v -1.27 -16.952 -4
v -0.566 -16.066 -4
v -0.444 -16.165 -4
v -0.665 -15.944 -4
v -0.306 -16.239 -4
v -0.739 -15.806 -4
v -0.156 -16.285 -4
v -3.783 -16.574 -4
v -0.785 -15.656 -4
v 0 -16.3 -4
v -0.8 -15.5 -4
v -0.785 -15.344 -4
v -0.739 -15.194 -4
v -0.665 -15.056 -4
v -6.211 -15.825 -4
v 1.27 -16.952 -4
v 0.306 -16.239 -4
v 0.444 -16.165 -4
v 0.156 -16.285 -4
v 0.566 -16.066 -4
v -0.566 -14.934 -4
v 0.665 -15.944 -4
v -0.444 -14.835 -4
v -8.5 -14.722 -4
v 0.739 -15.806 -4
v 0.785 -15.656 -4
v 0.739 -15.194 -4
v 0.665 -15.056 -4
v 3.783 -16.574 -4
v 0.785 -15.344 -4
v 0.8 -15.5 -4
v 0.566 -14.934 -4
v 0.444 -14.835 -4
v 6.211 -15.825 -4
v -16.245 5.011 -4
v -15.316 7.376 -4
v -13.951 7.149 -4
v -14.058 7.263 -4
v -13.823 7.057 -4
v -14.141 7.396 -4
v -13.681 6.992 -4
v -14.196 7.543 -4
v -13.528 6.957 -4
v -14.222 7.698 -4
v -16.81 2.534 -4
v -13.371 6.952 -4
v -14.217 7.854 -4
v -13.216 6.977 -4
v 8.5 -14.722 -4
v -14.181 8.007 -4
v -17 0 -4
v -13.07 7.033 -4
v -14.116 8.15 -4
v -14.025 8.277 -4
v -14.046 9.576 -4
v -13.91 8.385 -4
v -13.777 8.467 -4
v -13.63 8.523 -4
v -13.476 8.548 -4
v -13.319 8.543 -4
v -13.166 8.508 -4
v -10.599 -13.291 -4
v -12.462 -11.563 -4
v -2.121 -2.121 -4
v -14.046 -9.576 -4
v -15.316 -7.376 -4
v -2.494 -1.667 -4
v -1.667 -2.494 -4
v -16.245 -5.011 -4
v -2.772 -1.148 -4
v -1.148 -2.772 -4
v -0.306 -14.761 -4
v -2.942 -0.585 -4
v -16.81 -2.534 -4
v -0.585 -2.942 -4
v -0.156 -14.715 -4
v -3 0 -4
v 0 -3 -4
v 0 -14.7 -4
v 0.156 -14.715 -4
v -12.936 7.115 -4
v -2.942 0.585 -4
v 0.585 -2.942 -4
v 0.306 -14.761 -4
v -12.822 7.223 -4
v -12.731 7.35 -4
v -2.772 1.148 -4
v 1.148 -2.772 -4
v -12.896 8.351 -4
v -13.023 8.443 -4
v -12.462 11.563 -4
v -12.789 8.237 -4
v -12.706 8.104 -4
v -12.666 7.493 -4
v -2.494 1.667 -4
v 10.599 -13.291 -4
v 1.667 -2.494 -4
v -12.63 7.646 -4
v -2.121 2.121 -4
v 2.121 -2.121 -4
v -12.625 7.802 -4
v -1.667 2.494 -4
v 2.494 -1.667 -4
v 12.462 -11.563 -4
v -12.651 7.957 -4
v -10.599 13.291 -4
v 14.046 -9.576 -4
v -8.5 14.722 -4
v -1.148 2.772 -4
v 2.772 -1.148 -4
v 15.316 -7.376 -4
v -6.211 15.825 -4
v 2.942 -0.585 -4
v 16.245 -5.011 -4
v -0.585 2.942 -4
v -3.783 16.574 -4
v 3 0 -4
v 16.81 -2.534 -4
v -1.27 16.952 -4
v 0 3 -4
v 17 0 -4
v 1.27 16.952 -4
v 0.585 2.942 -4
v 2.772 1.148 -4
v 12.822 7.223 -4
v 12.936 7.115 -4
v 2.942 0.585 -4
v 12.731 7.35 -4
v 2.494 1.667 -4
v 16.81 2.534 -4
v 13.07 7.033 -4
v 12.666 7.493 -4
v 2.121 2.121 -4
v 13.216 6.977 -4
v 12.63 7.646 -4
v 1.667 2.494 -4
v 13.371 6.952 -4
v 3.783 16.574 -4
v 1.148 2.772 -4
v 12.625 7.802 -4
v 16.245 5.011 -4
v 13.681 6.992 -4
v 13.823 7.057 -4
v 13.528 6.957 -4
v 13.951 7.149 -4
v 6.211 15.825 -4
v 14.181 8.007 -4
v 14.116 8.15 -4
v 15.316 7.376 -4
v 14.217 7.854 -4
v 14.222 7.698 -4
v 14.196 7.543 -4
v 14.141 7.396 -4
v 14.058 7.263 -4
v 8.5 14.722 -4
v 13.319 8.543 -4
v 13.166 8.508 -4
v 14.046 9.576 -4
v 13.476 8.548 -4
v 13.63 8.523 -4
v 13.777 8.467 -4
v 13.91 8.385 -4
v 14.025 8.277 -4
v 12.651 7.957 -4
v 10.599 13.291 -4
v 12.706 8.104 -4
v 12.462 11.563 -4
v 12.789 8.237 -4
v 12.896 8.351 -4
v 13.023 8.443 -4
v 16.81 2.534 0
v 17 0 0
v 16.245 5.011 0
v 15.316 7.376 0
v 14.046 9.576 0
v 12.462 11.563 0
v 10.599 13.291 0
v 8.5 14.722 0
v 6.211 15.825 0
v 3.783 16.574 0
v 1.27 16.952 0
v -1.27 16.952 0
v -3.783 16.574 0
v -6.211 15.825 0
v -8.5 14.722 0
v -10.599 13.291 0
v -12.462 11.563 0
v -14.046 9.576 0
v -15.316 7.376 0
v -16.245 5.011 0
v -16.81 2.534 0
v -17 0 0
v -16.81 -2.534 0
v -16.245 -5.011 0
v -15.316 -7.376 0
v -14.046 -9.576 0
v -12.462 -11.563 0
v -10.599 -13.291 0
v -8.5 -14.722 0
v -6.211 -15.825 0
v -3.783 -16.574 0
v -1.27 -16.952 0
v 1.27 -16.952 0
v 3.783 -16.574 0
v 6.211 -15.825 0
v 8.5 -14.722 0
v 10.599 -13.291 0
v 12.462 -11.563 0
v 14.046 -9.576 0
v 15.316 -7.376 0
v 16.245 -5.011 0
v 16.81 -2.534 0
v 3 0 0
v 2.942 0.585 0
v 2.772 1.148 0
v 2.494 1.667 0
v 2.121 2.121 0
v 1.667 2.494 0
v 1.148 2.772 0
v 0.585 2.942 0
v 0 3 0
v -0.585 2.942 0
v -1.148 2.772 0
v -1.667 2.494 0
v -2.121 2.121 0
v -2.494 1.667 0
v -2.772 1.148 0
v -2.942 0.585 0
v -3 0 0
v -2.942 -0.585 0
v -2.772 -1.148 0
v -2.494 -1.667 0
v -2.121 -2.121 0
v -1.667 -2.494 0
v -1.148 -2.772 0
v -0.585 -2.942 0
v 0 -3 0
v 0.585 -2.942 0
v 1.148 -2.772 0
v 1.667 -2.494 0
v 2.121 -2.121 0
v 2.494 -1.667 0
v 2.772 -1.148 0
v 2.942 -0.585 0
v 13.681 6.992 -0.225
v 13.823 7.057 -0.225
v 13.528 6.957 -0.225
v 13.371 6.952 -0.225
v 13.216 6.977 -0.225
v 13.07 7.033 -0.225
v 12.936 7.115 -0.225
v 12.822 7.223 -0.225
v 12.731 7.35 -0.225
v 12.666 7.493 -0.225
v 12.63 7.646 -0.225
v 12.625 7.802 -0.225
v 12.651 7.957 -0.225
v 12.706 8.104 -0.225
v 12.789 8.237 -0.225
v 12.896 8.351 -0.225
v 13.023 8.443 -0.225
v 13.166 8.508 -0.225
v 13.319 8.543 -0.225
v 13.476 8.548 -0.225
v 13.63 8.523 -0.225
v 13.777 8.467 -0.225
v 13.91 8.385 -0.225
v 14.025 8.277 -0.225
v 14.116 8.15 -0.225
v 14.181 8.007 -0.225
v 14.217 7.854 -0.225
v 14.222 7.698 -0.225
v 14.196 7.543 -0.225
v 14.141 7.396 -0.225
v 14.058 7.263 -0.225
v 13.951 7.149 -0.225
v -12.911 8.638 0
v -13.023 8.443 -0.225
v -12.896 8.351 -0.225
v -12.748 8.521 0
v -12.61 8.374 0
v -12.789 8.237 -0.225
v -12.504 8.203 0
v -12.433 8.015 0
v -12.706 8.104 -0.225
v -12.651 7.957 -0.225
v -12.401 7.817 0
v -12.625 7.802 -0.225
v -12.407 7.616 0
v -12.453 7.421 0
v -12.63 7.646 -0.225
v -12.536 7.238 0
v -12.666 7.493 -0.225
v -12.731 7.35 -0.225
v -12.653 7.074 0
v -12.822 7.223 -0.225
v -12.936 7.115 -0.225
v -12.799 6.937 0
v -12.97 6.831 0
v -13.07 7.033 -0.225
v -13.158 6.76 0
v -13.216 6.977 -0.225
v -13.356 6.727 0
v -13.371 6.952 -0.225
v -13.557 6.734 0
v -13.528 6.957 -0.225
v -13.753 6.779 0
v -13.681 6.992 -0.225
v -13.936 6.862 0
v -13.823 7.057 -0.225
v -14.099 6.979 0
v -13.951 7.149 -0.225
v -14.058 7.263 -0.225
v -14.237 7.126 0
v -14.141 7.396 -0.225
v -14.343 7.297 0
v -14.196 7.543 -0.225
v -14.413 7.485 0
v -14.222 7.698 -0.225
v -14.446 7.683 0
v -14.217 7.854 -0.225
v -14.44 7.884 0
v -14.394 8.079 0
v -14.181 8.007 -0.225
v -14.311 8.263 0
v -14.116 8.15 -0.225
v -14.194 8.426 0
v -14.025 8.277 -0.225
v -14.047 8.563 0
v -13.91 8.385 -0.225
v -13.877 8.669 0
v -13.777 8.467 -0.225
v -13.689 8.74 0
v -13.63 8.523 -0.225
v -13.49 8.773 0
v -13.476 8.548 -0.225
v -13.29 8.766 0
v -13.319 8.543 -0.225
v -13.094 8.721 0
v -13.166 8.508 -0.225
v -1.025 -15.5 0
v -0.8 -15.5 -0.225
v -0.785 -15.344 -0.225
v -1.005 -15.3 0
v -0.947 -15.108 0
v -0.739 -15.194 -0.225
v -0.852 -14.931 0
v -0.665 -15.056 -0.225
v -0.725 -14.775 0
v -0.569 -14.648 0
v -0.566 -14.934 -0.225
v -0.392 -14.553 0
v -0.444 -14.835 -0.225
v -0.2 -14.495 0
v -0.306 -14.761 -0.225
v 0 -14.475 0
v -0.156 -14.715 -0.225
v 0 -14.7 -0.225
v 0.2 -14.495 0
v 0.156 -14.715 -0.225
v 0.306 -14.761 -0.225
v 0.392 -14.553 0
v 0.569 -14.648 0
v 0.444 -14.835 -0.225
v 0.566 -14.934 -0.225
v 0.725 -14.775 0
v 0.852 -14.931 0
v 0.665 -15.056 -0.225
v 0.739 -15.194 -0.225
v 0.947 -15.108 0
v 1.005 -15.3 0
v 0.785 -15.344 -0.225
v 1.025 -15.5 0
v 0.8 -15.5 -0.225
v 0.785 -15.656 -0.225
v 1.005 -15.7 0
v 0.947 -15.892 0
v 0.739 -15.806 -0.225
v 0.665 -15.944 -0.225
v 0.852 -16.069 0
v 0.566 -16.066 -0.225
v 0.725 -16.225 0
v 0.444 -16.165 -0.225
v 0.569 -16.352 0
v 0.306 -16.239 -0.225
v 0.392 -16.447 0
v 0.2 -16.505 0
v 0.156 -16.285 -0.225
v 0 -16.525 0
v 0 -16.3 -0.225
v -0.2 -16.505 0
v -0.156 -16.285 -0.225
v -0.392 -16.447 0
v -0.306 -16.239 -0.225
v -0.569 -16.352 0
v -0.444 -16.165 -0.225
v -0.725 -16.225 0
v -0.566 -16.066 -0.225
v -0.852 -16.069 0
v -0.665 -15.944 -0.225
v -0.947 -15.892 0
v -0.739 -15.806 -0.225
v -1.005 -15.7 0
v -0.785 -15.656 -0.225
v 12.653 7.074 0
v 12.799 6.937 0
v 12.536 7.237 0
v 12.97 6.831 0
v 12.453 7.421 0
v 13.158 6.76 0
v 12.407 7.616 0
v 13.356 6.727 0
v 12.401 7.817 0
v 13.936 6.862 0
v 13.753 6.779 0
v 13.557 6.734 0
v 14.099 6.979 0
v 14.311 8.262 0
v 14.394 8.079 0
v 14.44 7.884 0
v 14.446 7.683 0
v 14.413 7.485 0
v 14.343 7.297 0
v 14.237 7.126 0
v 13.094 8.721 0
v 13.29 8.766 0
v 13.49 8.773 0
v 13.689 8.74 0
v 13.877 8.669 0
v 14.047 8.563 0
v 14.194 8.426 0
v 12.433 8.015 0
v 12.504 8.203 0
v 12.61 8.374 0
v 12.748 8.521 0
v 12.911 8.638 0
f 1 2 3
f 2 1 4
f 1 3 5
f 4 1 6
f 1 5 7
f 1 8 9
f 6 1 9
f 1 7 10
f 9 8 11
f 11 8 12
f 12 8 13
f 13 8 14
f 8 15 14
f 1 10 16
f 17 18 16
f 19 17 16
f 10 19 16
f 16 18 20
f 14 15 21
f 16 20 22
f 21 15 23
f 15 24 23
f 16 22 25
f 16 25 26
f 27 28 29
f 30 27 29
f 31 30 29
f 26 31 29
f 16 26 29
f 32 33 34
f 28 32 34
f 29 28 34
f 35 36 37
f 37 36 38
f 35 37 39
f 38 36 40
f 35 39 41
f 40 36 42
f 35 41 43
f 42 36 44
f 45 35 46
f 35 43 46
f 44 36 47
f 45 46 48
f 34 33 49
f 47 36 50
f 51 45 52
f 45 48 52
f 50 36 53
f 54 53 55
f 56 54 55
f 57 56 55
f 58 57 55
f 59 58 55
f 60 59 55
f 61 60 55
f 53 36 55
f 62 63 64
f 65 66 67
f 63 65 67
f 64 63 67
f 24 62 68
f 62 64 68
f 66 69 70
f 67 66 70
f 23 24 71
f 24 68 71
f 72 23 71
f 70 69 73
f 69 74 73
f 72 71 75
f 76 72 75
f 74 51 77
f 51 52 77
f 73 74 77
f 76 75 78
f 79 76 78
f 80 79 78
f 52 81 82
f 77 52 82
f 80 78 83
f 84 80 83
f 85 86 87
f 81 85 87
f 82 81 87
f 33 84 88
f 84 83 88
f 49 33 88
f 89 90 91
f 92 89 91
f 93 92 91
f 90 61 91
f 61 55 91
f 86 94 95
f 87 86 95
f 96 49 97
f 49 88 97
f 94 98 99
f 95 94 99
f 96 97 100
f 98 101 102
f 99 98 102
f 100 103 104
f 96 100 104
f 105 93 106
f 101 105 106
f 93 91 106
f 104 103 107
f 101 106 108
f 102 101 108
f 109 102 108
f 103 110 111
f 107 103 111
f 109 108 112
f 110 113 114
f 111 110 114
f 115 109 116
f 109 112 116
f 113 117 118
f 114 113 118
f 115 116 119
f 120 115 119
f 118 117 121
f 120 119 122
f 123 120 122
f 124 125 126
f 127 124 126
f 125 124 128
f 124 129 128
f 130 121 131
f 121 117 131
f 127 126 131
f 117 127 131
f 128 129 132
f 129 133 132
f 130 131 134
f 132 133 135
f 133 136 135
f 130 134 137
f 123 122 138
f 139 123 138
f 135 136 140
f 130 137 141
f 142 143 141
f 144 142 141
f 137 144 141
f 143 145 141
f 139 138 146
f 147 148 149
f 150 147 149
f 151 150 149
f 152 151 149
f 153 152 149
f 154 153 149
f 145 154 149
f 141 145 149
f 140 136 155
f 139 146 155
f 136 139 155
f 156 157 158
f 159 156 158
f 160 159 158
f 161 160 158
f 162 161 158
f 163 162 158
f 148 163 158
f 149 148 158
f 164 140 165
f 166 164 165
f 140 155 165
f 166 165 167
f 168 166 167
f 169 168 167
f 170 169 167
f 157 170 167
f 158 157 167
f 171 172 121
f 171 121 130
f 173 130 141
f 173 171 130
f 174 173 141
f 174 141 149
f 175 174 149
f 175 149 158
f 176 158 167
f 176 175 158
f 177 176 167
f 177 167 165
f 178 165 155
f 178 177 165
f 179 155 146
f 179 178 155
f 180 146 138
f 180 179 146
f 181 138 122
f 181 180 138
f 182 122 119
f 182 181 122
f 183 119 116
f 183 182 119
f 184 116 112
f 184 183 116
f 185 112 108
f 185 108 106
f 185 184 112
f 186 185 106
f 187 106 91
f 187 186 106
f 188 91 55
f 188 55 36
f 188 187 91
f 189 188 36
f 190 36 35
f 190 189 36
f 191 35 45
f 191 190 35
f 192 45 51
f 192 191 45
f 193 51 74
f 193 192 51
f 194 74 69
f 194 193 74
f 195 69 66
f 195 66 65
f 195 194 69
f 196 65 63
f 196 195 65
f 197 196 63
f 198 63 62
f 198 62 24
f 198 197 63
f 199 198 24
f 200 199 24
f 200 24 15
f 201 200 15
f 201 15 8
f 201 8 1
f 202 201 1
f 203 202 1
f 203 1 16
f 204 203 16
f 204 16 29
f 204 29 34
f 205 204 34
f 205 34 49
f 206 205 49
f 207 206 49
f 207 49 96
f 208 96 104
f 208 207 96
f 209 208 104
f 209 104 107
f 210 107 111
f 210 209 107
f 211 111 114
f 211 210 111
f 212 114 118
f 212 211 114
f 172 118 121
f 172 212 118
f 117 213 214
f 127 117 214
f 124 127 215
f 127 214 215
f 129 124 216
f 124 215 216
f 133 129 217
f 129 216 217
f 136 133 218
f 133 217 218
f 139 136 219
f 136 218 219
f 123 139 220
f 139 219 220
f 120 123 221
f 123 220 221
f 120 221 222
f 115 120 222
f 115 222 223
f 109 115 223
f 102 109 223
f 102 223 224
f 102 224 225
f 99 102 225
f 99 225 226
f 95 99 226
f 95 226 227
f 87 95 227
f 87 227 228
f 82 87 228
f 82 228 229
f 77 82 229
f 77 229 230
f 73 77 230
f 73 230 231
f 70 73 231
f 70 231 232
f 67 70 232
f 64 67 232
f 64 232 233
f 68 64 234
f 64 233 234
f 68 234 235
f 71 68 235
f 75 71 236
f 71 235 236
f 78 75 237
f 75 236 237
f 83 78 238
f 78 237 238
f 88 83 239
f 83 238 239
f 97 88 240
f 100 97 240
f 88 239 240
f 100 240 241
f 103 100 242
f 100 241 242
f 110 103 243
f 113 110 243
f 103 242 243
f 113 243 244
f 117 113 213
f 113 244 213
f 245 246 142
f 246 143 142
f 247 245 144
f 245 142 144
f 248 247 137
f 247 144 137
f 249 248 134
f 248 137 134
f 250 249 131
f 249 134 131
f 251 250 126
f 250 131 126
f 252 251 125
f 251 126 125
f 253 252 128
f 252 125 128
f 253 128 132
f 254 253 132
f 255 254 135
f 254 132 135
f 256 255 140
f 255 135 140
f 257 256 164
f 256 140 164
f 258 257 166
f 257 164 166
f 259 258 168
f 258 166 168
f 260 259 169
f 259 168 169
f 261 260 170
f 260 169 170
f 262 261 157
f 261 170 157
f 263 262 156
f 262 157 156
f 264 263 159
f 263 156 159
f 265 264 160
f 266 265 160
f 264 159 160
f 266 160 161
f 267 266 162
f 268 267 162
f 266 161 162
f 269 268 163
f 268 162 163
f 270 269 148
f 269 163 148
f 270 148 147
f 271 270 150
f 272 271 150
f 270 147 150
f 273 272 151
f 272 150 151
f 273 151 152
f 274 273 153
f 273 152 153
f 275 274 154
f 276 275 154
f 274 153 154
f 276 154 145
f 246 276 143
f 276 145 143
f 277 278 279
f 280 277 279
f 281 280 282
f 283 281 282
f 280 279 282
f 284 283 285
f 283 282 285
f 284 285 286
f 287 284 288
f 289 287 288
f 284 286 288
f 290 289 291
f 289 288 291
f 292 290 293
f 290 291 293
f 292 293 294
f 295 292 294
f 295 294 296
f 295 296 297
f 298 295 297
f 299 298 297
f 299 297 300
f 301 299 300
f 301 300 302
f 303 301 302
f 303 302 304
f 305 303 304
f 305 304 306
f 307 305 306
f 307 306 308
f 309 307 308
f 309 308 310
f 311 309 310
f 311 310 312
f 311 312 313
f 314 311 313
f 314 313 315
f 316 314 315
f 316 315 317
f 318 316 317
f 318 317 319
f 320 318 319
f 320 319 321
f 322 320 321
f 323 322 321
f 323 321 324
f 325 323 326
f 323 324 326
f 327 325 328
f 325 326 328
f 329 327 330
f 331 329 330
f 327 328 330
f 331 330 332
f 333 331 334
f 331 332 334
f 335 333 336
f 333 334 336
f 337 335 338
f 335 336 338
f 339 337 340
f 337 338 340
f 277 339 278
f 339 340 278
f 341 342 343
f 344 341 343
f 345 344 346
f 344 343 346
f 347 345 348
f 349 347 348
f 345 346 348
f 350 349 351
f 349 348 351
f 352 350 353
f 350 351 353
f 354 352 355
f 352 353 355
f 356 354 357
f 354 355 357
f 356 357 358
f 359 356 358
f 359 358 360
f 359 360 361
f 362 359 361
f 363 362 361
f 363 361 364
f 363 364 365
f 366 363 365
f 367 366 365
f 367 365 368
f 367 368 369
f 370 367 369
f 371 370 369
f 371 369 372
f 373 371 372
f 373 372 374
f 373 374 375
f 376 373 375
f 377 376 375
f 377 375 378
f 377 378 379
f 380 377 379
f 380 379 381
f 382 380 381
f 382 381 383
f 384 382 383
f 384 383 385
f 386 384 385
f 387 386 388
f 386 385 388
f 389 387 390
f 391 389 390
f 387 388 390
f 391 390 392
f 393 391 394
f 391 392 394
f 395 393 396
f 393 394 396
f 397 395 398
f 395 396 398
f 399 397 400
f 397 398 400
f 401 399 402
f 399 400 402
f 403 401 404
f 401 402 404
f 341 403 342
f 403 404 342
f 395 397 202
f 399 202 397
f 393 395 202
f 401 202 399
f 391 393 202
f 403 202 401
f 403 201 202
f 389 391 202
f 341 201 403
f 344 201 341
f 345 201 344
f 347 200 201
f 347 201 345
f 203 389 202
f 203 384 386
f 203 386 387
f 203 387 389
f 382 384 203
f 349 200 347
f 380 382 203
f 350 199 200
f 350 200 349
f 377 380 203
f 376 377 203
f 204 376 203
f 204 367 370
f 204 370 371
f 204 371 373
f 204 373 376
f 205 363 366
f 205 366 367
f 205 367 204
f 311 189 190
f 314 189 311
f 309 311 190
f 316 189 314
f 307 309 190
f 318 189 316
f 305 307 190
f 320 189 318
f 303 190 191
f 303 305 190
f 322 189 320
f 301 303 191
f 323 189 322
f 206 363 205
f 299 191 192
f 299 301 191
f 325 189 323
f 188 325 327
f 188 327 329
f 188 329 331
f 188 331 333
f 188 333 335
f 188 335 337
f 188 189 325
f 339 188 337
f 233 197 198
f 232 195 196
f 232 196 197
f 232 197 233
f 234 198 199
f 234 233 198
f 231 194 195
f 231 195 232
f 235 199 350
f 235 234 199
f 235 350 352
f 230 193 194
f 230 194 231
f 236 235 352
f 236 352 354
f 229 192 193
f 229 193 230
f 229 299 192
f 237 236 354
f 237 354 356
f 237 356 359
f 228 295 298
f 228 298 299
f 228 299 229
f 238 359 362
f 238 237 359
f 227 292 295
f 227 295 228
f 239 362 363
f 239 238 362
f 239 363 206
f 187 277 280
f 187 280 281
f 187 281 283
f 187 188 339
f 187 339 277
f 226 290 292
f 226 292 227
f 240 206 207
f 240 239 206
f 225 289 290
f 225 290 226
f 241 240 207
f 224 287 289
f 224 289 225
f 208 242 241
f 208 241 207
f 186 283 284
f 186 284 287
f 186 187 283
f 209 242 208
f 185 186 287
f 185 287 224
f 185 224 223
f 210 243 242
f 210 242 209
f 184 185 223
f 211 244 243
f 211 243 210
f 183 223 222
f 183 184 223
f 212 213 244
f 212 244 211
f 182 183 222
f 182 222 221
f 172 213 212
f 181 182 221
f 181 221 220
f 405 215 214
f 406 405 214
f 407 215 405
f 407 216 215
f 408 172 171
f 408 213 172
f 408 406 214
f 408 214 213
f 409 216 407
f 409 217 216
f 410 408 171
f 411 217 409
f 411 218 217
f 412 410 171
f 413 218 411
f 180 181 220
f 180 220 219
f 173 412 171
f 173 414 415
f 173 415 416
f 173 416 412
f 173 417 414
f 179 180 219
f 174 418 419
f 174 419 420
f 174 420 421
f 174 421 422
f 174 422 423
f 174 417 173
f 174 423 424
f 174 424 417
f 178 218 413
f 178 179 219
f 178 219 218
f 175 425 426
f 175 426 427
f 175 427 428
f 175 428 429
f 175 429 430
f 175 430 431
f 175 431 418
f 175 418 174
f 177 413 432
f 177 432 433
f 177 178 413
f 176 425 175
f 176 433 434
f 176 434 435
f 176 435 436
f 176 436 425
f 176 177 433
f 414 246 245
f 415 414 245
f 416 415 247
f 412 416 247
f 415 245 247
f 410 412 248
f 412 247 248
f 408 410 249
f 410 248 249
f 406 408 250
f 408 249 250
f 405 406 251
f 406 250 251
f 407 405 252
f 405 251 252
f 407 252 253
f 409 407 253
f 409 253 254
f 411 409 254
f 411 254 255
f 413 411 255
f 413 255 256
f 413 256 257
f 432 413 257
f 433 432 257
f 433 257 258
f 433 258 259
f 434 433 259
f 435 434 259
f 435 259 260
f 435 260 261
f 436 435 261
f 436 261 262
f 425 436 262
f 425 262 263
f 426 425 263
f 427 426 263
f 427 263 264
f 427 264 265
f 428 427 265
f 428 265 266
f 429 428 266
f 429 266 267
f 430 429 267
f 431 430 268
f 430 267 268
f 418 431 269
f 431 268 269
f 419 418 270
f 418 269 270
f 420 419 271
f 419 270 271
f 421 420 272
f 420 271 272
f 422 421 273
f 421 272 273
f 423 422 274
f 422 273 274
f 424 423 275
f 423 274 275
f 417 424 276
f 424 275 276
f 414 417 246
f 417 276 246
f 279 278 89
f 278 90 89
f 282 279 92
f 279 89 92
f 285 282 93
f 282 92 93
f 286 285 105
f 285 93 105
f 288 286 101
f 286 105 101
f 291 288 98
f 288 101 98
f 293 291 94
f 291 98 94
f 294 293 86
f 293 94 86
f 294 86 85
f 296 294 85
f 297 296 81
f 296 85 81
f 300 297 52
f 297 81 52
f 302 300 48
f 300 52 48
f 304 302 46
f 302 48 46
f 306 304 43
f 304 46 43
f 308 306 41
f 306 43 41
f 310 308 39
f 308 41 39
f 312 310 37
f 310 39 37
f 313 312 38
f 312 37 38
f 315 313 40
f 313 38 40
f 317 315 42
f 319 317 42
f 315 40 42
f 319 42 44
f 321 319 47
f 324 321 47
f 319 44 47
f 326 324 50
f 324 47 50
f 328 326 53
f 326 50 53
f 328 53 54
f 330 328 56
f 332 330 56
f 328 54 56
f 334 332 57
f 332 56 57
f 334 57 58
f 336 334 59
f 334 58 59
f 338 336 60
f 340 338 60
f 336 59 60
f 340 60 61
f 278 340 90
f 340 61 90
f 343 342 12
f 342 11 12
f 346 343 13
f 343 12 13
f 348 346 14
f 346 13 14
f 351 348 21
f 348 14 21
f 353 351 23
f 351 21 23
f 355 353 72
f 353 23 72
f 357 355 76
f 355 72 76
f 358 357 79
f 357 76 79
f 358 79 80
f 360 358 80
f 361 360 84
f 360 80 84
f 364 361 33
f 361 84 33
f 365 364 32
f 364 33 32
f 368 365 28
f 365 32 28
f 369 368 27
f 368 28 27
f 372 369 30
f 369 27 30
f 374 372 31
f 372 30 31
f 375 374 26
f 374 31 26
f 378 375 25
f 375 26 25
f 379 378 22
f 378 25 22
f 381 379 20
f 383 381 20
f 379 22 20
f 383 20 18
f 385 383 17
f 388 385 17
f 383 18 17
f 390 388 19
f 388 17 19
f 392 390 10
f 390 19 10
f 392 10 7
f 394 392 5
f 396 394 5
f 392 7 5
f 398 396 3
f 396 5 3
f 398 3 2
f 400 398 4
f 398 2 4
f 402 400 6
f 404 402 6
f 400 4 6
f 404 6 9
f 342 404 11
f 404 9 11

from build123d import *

# Parameters (mm, degrees)
SKETCH1_R                       = 17
BOSS_EXTRUDE1_DEPTH             = 4
M2X0_4_TAPPED_HOLE1_D           = 1.6
M2X0_4_TAPPED_HOLE1_CSINK_D     = 2.05
M2X0_4_TAPPED_HOLE1_CSINK_ANGLE = 90
CIRPATTERN1_COUNT               = 3
SKETCH4_R                       = 3
CUT_EXTRUDE1_DEPTH              = 5


with BuildPart() as part:
    # Sketch1 → Boss-Extrude1 (new body)
    with BuildSketch(Plane.XY):
        Circle(SKETCH1_R)
    extrude(amount=-BOSS_EXTRUDE1_DEPTH)

    # M2x0.4 Tapped Hole1 (through all)
    with Locations(Plane.XY):
        with Locations((0, -15.5)):
            m2x0_4_tapped_hole1 = CounterSinkHole(M2X0_4_TAPPED_HOLE1_D / 2, M2X0_4_TAPPED_HOLE1_CSINK_D / 2, counter_sink_angle=M2X0_4_TAPPED_HOLE1_CSINK_ANGLE)

    # CirPattern1: M2x0.4 Tapped Hole1 ×3 about axis
    cirpattern1_axis = Axis((0, 0, 0), (0, 0, 1))
    for i in range(1, CIRPATTERN1_COUNT):
        add(m2x0_4_tapped_hole1.rotate(cirpattern1_axis, i * 360 / CIRPATTERN1_COUNT), mode=Mode.SUBTRACT)

    # Sketch4 → Cut-Extrude1 (cut, through all)
    with BuildSketch(Plane.XY):
        Circle(SKETCH4_R)
    extrude(amount=-CUT_EXTRUDE1_DEPTH, mode=Mode.SUBTRACT)


solid = part.part
